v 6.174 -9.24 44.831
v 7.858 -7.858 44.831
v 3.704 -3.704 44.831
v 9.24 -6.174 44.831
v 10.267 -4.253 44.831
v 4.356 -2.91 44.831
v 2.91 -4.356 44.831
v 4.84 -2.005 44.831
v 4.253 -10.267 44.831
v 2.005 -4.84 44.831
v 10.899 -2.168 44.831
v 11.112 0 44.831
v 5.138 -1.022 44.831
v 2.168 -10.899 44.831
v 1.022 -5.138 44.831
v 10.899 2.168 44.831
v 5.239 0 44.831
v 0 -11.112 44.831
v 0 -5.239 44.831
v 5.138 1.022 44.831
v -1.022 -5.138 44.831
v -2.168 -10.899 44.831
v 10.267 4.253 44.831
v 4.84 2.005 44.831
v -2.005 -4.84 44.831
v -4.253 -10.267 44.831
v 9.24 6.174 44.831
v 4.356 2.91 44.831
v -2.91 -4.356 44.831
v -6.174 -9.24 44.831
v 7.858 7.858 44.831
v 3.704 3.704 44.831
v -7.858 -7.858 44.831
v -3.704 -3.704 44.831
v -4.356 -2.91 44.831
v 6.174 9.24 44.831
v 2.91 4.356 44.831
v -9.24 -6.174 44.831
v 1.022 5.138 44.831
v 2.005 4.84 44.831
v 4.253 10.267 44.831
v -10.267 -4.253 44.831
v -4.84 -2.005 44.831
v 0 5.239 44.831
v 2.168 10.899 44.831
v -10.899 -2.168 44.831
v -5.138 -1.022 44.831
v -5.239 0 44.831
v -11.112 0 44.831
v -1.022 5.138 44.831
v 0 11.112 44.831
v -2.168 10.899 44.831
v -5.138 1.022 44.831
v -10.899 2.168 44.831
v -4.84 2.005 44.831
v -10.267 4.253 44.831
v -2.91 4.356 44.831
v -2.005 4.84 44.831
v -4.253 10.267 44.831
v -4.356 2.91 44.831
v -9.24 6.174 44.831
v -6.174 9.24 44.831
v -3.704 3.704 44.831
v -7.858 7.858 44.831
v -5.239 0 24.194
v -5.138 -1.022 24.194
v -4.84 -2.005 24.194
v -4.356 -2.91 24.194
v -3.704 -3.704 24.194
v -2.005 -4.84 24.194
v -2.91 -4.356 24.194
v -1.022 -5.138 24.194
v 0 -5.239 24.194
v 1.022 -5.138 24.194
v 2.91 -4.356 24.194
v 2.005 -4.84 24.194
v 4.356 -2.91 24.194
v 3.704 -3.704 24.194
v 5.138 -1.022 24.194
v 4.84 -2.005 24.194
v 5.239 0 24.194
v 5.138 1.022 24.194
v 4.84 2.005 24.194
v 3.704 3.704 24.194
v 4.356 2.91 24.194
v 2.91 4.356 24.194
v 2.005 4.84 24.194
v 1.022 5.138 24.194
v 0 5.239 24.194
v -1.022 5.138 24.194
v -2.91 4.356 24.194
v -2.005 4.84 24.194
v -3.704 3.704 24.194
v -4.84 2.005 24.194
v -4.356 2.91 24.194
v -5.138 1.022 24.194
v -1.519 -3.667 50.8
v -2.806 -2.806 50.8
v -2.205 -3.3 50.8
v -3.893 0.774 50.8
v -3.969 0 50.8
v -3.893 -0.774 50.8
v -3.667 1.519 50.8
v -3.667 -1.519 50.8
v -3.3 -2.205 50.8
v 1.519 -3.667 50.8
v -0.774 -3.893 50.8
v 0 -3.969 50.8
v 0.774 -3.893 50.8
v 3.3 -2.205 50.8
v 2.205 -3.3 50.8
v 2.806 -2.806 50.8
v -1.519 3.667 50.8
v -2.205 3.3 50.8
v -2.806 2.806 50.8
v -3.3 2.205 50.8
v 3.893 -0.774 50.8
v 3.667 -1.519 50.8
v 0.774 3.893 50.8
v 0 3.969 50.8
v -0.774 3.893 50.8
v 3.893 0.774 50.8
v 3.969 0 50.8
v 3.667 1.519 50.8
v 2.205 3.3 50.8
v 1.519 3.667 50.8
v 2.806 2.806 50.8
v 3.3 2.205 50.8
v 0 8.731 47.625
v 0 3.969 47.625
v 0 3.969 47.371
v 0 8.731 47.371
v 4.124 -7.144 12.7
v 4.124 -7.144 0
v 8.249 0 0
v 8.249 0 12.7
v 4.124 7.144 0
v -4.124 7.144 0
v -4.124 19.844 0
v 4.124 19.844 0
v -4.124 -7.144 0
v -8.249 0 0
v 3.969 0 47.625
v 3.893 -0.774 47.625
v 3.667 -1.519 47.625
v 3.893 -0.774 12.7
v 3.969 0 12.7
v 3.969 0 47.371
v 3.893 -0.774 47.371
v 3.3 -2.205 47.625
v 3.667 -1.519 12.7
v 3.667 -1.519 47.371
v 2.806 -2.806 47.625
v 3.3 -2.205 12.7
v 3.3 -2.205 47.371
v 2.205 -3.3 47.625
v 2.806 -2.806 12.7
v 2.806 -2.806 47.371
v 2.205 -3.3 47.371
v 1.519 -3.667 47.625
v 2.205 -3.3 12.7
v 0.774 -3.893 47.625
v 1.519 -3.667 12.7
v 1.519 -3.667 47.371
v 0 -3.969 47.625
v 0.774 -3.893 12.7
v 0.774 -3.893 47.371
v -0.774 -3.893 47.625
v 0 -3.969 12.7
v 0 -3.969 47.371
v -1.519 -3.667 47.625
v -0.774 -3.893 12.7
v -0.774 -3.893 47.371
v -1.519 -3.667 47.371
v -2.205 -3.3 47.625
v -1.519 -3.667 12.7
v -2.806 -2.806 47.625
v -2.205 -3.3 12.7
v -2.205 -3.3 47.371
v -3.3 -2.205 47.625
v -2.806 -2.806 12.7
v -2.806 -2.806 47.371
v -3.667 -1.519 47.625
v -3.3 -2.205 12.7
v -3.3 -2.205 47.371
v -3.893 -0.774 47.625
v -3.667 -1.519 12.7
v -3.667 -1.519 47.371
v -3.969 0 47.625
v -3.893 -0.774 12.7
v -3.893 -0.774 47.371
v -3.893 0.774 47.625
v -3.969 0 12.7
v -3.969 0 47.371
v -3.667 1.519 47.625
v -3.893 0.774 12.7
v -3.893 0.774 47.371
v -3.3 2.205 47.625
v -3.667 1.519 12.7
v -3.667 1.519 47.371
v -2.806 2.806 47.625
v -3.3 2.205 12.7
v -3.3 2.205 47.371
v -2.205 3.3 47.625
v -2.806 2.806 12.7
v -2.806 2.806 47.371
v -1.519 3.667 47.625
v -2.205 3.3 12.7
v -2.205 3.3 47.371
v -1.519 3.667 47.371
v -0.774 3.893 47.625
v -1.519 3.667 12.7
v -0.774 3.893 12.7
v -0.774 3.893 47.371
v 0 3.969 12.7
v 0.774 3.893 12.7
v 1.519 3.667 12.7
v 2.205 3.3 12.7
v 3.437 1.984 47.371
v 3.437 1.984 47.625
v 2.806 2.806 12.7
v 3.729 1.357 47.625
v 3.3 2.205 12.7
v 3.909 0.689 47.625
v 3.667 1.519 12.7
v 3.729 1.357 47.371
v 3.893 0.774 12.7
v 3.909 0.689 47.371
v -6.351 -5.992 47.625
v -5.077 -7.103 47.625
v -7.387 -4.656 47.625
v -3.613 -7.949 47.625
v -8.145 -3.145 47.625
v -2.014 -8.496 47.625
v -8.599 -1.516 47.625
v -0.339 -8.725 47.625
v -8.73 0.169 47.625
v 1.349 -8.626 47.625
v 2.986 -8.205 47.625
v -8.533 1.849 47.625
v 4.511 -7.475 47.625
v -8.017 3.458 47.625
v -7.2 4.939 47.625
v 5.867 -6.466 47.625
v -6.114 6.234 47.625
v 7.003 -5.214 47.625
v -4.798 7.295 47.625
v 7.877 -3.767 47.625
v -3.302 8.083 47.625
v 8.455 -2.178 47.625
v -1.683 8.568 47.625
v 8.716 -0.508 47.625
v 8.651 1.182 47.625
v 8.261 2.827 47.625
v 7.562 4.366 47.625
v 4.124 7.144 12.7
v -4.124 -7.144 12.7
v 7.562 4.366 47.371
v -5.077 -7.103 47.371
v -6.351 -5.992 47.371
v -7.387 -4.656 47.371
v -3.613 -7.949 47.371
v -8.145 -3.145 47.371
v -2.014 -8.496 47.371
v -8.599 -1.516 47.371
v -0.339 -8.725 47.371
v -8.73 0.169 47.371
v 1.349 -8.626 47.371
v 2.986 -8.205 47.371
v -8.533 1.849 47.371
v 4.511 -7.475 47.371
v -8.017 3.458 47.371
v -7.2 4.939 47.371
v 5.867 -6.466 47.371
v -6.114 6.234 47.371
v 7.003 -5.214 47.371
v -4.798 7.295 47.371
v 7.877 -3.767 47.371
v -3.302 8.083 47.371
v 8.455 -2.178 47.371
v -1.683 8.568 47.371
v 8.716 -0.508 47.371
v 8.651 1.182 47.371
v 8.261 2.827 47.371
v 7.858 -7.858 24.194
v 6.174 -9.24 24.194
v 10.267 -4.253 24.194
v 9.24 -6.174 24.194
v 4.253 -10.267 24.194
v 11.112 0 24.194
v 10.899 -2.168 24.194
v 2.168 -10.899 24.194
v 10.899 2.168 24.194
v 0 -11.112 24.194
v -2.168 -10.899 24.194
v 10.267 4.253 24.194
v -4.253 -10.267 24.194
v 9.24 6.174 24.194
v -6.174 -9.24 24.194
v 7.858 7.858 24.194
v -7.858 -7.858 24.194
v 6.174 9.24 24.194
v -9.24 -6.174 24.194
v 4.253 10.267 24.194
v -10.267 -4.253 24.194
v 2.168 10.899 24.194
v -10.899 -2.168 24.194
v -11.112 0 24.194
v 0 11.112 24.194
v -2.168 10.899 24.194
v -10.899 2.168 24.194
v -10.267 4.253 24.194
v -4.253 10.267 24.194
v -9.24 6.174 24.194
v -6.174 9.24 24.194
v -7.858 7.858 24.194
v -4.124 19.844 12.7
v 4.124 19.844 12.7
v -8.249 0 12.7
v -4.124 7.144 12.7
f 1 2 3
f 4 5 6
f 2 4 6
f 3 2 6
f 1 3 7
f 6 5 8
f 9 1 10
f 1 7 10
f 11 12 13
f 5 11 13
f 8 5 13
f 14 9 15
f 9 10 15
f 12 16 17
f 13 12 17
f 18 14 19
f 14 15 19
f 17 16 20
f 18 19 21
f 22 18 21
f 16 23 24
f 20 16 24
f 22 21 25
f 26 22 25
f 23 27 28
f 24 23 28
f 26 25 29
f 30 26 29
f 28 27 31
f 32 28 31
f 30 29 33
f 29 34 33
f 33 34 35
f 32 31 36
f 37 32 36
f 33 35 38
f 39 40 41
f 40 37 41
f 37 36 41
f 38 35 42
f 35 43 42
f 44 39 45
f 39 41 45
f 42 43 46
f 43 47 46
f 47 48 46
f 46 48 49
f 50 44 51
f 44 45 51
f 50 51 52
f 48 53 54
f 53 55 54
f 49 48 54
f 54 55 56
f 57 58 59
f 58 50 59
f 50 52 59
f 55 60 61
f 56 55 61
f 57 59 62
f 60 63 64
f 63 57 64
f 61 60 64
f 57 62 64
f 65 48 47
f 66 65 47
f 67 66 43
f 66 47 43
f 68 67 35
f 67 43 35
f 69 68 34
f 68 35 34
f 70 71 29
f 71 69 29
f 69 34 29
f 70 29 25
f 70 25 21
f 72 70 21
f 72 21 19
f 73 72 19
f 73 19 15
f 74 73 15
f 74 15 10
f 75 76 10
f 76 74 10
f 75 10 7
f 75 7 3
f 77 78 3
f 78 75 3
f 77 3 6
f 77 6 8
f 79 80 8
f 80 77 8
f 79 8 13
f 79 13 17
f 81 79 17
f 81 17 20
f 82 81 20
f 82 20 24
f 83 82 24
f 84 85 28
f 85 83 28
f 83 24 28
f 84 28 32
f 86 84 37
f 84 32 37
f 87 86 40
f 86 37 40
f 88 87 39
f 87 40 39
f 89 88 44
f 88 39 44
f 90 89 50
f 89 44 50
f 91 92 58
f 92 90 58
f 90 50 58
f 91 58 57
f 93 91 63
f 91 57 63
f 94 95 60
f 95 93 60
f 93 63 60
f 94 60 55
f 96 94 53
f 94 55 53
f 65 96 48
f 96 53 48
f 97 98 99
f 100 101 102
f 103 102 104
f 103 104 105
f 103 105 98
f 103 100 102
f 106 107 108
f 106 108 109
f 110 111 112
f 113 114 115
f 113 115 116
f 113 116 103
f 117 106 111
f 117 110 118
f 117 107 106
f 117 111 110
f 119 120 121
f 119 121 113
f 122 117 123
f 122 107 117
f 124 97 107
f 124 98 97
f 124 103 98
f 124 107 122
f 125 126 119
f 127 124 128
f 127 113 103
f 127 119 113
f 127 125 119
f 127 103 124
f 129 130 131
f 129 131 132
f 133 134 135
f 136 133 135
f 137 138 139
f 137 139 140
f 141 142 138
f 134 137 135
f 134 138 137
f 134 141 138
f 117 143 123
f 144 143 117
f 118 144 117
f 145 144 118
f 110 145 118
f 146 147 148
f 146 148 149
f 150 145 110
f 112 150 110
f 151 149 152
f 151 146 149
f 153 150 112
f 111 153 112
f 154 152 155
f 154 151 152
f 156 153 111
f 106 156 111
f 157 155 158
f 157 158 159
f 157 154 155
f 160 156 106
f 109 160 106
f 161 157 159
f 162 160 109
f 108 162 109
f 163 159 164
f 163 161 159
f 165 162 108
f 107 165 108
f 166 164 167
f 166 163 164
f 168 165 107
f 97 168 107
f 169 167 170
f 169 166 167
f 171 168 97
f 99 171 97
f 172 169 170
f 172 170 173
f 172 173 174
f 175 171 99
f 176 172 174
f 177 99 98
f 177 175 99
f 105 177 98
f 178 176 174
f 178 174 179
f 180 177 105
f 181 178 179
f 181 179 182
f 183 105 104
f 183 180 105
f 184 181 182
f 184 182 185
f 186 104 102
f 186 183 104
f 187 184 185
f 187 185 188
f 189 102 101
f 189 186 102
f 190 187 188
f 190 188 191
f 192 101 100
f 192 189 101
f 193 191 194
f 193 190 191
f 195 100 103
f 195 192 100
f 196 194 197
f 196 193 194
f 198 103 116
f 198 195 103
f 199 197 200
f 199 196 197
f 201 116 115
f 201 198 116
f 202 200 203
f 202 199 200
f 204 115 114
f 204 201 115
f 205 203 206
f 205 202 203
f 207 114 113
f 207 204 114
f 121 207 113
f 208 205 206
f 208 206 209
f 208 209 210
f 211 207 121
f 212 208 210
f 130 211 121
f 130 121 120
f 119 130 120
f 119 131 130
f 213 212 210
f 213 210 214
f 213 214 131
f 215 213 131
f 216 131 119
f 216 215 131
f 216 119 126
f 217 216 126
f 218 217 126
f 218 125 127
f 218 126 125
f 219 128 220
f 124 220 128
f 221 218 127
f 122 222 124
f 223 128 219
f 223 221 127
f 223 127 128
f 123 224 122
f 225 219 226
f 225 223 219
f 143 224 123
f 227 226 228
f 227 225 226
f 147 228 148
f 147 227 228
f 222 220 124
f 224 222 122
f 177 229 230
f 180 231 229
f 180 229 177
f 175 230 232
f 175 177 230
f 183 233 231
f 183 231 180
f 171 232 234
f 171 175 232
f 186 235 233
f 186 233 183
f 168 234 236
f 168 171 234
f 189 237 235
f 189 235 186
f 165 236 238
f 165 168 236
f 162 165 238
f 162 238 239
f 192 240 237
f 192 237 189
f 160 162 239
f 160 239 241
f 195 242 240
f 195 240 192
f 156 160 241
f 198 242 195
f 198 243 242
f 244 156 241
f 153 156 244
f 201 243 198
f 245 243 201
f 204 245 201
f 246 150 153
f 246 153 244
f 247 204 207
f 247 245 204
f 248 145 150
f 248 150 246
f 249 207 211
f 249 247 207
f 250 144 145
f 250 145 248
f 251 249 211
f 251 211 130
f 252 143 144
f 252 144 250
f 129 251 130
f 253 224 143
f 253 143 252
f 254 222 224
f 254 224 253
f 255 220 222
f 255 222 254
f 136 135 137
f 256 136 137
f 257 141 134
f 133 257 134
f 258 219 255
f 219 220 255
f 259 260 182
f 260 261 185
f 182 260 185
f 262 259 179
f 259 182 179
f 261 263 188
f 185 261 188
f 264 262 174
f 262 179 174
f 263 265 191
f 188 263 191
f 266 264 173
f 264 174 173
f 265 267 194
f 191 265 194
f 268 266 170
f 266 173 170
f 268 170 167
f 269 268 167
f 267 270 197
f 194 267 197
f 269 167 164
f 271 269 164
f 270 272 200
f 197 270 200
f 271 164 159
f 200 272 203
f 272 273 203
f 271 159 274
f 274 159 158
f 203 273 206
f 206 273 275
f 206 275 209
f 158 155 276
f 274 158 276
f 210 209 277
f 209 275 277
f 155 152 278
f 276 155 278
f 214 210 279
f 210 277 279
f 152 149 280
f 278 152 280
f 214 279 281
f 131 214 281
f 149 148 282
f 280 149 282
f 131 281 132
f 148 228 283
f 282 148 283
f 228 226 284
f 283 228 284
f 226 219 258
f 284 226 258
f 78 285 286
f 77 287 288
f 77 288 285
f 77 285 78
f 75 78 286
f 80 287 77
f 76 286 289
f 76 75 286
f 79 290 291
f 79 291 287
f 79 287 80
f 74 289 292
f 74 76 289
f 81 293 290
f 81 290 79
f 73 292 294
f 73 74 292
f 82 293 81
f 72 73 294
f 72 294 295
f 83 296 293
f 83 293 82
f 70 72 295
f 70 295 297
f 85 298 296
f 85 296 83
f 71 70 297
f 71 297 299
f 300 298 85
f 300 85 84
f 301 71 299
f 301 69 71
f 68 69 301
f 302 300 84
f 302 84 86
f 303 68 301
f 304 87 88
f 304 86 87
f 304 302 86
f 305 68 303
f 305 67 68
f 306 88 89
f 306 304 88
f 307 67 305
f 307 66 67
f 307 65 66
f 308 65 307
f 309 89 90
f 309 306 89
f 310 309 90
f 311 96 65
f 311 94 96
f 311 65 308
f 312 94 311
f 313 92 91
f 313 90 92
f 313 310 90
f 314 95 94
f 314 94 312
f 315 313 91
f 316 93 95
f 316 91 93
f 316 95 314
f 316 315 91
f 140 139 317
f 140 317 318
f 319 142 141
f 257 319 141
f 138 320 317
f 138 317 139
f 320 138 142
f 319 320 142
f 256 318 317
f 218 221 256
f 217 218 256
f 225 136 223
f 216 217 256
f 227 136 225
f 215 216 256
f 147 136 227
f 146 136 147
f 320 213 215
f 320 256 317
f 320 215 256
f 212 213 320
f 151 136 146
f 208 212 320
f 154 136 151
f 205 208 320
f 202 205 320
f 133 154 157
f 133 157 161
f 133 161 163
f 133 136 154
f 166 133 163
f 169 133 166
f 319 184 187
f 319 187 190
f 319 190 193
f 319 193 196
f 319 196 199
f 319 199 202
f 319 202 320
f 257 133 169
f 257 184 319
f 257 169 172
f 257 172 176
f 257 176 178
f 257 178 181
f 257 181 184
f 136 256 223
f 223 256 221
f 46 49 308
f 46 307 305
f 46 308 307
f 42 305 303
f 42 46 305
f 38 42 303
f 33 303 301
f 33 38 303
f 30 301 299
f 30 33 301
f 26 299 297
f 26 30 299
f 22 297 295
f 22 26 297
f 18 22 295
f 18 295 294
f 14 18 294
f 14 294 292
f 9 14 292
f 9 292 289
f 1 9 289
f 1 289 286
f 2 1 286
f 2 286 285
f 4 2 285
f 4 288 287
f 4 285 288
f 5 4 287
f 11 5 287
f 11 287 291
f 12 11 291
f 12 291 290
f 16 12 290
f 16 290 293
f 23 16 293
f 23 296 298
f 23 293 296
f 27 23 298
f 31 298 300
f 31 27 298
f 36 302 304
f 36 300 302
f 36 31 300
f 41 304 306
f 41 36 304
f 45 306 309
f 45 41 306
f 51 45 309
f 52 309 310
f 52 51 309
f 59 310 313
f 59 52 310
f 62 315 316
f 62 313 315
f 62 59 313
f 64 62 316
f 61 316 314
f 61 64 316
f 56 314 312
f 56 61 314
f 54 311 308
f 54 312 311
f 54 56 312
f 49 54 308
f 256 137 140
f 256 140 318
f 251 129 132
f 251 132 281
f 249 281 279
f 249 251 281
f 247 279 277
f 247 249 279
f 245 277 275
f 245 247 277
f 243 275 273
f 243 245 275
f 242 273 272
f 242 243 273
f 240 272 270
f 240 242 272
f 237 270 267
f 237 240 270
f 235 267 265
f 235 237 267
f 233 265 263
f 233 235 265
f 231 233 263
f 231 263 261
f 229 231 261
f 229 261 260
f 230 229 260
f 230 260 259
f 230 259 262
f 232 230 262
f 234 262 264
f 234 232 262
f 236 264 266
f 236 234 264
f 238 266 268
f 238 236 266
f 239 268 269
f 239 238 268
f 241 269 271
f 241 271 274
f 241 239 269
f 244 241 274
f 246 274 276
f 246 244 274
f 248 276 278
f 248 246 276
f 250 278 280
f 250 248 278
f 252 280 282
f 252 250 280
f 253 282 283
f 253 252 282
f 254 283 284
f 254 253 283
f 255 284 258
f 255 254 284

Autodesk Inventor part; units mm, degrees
ref_plane "YZ Plane" through (0, 0, 0) normal (1, 0, 0) x (0, 1, 0)
sketch "Sketch1" plane through (0, 0, 0) normal (0, 0, 1) x (1, 0, 0)
  circle A0 centre (0, 0) radius 3.9688
  dimension "d0" = 7.9375
extrude "Extrusion1" add sketch "Sketch1" along normal blind 50.8
ref_plane "Work Plane1" through (0, 0, 47.625) normal (0, 0, 1) x (1, 0, 0)
sketch "Sketch2" plane through (0, 0, 47.625) normal (0, 0, 1) x (1, 0, 0)
  arc A0 (0, 8.7313) -> (7.5615, 4.3656) centre (0, 0) ccw
  line L0 (0, 0) -> (0, 8.7313)
  line L1 (0, 0) -> (7.5615, 4.3656)
  dimension "d4" = 17.4625
  dimension "d5" = 60
extrude "Extrusion2" add sketch "Sketch2" against normal blind 0.254
ref_plane "Work Plane2" through (0, 0, 44.831) normal (0, 0, -1) x (-1, 0, 0)
sketch "Sketch3" plane through (0, 0, 44.831) normal (0, 0, -1) x (-1, 0, 0)
  circle A0 centre (0, 0) radius 3.9687 projected
  circle A1 centre (0, 0) radius 11.1125
  circle A2 centre (0, 0) radius 5.2387
  dimension "d9" = 22.225
  dimension "d10" = 1.27
extrude "Extrusion3" add sketch "Sketch3" along normal blind 20.6375 contours A1
sketch "Sketch4" plane through (0, 0, 0) normal (0, 0, -1) x (-1, 0, 0)
  circle A0 centre (0, 0) radius 3.9687 projected
  line L0 (8.2489, 0) -> (4.1244, -7.1437)
  line L1 (4.1244, -7.1437) -> (-4.1244, -7.1437)
  line L2 (-4.1244, -7.1437) -> (-8.2489, 0)
  line L3 (-8.2489, 0) -> (-4.1244, 7.1438)
  line L4 (-4.1244, 7.1438) -> (4.1244, 7.1438)
  line L5 (4.1244, 7.1438) -> (8.2489, 0)
  dimension "d13" = 14.2875
extrude "Extrusion4" add sketch "Sketch4" against normal blind 12.7
sketch "Sketch5" plane through (-4.1244, 7.1438, 0) normal (0, 1, 0) x (1, 0, 0)
  line L0 (8.2489, 0) -> (8.2489, -12.7) projected
  line L1 (0, 0) -> (8.2489, 0)
  line L2 (8.2489, 0) -> (8.2489, -12.7)
  line L3 (8.2489, -12.7) -> (0, -12.7)
  line L4 (0, -12.7) -> (0, 0)
  point P0 (4.1244, 0)
extrude "Extrusion5" add sketch "Sketch5" along normal blind 12.7
properties part number "Float_Switch"
